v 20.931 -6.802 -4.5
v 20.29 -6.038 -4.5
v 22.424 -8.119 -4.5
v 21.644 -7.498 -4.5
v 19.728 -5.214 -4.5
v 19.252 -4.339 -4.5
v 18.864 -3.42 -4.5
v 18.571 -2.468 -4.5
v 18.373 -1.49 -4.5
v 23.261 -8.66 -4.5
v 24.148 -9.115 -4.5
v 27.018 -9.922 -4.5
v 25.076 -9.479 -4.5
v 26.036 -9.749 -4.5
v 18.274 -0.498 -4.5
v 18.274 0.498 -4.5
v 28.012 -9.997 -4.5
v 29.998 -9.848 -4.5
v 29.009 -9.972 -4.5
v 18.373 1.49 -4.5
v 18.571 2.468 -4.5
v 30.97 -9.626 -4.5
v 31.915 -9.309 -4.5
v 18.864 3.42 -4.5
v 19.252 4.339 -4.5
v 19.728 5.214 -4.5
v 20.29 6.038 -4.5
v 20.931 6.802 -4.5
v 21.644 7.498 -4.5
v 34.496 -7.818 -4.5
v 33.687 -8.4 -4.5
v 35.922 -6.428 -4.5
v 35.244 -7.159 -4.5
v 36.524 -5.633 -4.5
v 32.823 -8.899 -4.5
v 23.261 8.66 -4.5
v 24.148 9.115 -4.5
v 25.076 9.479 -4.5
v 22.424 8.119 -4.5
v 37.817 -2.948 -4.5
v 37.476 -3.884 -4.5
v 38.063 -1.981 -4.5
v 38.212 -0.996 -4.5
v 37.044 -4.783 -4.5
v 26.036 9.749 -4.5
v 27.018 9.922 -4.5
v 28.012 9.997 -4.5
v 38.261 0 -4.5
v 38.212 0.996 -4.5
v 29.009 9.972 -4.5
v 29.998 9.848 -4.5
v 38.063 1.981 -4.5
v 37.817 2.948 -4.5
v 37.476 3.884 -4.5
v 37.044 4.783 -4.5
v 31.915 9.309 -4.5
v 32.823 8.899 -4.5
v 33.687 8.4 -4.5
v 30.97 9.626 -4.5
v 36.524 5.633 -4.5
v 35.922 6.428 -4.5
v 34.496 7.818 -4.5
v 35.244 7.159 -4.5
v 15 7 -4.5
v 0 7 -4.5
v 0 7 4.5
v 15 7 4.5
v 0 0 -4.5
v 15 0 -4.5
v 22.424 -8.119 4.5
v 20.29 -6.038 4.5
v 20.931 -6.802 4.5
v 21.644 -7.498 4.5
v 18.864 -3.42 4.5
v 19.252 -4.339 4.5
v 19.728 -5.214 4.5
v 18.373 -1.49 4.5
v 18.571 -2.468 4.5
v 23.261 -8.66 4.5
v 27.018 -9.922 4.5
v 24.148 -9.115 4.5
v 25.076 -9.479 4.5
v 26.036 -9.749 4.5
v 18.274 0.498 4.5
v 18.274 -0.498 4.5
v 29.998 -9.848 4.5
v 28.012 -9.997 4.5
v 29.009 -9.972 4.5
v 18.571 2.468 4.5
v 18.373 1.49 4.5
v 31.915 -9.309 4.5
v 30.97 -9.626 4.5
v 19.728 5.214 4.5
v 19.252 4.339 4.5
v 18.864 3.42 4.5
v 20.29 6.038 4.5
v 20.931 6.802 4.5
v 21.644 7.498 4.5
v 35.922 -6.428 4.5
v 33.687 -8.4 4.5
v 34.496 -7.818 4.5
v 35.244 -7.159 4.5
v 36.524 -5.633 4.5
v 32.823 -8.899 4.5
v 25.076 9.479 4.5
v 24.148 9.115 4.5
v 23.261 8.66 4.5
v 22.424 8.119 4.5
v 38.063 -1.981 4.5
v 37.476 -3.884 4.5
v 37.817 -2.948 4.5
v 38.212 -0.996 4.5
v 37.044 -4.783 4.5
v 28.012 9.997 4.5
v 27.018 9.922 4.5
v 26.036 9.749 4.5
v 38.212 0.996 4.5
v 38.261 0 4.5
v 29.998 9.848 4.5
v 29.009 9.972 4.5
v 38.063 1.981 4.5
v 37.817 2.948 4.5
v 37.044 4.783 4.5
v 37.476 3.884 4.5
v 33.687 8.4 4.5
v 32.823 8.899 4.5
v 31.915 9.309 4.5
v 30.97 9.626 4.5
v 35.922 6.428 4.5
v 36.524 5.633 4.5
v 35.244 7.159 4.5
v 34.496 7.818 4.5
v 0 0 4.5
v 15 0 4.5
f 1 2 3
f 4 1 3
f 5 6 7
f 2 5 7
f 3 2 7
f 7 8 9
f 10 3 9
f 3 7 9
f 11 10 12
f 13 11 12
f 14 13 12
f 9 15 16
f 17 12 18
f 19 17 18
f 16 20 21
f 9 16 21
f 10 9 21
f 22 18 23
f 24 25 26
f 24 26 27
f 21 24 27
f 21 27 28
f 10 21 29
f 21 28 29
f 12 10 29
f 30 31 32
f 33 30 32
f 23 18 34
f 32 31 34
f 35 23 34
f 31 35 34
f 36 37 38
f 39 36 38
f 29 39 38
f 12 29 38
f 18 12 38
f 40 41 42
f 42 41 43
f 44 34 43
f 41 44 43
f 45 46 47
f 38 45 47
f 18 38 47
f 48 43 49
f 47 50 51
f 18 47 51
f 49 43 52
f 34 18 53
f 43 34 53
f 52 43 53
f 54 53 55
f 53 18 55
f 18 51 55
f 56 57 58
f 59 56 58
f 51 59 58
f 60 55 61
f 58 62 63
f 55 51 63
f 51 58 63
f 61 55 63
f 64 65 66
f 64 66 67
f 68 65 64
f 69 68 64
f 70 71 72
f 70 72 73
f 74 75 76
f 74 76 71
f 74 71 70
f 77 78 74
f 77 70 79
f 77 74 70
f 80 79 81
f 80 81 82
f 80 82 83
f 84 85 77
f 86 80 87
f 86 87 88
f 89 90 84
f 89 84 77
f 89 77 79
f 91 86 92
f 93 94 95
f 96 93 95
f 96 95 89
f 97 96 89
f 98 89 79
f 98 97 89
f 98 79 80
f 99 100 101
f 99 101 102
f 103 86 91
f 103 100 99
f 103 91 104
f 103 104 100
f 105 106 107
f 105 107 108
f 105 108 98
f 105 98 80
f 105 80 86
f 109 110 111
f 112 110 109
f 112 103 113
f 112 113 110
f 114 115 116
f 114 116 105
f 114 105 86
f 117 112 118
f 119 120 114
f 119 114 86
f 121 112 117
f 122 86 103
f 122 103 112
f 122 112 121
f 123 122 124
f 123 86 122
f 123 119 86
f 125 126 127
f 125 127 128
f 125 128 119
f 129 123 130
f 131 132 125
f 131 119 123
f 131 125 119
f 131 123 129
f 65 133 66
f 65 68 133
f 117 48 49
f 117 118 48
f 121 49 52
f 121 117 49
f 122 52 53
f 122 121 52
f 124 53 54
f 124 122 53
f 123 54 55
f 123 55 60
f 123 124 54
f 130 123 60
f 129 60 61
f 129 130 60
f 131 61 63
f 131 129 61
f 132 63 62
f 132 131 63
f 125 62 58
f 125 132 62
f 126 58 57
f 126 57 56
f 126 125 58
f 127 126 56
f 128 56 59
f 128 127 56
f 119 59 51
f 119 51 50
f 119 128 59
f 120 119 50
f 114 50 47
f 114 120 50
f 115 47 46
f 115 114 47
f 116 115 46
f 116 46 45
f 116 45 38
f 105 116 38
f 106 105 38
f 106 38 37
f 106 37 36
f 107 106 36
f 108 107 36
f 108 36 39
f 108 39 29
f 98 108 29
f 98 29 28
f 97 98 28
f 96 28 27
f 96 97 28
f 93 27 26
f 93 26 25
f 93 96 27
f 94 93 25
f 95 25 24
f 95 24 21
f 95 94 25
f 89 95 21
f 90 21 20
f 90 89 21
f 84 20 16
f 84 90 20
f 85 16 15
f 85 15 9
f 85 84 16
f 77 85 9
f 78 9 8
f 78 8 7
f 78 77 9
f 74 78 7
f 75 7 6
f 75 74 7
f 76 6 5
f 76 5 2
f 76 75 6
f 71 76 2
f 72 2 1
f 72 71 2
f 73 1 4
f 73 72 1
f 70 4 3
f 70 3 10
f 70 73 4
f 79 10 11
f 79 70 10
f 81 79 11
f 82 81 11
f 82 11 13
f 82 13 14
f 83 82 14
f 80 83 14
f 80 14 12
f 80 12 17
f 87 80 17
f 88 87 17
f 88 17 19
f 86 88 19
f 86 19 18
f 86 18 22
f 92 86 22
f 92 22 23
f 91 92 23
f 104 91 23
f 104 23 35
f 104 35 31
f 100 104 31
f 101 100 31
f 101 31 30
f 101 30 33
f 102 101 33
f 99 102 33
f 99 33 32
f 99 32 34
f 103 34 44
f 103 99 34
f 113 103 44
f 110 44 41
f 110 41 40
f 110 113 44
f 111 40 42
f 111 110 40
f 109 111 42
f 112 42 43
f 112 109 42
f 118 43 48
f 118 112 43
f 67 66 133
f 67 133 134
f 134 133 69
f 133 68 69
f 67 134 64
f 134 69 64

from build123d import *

# Parameters (mm, degrees)
F0_W     = 15
F0_H     = 7
F0_R     = 10
F1_DEPTH = 4.5


with BuildPart() as f1:
    # F0 (on Top) → F1 (new body, symmetric)
    with BuildSketch(Plane.XY):
        with Locations((7.5, 3.5)):
            Rectangle(F0_W, F0_H)
        with Locations((28.261291, 0)):
            Circle(F0_R)
    extrude(amount=F1_DEPTH, both=True)


solid = f1.part
